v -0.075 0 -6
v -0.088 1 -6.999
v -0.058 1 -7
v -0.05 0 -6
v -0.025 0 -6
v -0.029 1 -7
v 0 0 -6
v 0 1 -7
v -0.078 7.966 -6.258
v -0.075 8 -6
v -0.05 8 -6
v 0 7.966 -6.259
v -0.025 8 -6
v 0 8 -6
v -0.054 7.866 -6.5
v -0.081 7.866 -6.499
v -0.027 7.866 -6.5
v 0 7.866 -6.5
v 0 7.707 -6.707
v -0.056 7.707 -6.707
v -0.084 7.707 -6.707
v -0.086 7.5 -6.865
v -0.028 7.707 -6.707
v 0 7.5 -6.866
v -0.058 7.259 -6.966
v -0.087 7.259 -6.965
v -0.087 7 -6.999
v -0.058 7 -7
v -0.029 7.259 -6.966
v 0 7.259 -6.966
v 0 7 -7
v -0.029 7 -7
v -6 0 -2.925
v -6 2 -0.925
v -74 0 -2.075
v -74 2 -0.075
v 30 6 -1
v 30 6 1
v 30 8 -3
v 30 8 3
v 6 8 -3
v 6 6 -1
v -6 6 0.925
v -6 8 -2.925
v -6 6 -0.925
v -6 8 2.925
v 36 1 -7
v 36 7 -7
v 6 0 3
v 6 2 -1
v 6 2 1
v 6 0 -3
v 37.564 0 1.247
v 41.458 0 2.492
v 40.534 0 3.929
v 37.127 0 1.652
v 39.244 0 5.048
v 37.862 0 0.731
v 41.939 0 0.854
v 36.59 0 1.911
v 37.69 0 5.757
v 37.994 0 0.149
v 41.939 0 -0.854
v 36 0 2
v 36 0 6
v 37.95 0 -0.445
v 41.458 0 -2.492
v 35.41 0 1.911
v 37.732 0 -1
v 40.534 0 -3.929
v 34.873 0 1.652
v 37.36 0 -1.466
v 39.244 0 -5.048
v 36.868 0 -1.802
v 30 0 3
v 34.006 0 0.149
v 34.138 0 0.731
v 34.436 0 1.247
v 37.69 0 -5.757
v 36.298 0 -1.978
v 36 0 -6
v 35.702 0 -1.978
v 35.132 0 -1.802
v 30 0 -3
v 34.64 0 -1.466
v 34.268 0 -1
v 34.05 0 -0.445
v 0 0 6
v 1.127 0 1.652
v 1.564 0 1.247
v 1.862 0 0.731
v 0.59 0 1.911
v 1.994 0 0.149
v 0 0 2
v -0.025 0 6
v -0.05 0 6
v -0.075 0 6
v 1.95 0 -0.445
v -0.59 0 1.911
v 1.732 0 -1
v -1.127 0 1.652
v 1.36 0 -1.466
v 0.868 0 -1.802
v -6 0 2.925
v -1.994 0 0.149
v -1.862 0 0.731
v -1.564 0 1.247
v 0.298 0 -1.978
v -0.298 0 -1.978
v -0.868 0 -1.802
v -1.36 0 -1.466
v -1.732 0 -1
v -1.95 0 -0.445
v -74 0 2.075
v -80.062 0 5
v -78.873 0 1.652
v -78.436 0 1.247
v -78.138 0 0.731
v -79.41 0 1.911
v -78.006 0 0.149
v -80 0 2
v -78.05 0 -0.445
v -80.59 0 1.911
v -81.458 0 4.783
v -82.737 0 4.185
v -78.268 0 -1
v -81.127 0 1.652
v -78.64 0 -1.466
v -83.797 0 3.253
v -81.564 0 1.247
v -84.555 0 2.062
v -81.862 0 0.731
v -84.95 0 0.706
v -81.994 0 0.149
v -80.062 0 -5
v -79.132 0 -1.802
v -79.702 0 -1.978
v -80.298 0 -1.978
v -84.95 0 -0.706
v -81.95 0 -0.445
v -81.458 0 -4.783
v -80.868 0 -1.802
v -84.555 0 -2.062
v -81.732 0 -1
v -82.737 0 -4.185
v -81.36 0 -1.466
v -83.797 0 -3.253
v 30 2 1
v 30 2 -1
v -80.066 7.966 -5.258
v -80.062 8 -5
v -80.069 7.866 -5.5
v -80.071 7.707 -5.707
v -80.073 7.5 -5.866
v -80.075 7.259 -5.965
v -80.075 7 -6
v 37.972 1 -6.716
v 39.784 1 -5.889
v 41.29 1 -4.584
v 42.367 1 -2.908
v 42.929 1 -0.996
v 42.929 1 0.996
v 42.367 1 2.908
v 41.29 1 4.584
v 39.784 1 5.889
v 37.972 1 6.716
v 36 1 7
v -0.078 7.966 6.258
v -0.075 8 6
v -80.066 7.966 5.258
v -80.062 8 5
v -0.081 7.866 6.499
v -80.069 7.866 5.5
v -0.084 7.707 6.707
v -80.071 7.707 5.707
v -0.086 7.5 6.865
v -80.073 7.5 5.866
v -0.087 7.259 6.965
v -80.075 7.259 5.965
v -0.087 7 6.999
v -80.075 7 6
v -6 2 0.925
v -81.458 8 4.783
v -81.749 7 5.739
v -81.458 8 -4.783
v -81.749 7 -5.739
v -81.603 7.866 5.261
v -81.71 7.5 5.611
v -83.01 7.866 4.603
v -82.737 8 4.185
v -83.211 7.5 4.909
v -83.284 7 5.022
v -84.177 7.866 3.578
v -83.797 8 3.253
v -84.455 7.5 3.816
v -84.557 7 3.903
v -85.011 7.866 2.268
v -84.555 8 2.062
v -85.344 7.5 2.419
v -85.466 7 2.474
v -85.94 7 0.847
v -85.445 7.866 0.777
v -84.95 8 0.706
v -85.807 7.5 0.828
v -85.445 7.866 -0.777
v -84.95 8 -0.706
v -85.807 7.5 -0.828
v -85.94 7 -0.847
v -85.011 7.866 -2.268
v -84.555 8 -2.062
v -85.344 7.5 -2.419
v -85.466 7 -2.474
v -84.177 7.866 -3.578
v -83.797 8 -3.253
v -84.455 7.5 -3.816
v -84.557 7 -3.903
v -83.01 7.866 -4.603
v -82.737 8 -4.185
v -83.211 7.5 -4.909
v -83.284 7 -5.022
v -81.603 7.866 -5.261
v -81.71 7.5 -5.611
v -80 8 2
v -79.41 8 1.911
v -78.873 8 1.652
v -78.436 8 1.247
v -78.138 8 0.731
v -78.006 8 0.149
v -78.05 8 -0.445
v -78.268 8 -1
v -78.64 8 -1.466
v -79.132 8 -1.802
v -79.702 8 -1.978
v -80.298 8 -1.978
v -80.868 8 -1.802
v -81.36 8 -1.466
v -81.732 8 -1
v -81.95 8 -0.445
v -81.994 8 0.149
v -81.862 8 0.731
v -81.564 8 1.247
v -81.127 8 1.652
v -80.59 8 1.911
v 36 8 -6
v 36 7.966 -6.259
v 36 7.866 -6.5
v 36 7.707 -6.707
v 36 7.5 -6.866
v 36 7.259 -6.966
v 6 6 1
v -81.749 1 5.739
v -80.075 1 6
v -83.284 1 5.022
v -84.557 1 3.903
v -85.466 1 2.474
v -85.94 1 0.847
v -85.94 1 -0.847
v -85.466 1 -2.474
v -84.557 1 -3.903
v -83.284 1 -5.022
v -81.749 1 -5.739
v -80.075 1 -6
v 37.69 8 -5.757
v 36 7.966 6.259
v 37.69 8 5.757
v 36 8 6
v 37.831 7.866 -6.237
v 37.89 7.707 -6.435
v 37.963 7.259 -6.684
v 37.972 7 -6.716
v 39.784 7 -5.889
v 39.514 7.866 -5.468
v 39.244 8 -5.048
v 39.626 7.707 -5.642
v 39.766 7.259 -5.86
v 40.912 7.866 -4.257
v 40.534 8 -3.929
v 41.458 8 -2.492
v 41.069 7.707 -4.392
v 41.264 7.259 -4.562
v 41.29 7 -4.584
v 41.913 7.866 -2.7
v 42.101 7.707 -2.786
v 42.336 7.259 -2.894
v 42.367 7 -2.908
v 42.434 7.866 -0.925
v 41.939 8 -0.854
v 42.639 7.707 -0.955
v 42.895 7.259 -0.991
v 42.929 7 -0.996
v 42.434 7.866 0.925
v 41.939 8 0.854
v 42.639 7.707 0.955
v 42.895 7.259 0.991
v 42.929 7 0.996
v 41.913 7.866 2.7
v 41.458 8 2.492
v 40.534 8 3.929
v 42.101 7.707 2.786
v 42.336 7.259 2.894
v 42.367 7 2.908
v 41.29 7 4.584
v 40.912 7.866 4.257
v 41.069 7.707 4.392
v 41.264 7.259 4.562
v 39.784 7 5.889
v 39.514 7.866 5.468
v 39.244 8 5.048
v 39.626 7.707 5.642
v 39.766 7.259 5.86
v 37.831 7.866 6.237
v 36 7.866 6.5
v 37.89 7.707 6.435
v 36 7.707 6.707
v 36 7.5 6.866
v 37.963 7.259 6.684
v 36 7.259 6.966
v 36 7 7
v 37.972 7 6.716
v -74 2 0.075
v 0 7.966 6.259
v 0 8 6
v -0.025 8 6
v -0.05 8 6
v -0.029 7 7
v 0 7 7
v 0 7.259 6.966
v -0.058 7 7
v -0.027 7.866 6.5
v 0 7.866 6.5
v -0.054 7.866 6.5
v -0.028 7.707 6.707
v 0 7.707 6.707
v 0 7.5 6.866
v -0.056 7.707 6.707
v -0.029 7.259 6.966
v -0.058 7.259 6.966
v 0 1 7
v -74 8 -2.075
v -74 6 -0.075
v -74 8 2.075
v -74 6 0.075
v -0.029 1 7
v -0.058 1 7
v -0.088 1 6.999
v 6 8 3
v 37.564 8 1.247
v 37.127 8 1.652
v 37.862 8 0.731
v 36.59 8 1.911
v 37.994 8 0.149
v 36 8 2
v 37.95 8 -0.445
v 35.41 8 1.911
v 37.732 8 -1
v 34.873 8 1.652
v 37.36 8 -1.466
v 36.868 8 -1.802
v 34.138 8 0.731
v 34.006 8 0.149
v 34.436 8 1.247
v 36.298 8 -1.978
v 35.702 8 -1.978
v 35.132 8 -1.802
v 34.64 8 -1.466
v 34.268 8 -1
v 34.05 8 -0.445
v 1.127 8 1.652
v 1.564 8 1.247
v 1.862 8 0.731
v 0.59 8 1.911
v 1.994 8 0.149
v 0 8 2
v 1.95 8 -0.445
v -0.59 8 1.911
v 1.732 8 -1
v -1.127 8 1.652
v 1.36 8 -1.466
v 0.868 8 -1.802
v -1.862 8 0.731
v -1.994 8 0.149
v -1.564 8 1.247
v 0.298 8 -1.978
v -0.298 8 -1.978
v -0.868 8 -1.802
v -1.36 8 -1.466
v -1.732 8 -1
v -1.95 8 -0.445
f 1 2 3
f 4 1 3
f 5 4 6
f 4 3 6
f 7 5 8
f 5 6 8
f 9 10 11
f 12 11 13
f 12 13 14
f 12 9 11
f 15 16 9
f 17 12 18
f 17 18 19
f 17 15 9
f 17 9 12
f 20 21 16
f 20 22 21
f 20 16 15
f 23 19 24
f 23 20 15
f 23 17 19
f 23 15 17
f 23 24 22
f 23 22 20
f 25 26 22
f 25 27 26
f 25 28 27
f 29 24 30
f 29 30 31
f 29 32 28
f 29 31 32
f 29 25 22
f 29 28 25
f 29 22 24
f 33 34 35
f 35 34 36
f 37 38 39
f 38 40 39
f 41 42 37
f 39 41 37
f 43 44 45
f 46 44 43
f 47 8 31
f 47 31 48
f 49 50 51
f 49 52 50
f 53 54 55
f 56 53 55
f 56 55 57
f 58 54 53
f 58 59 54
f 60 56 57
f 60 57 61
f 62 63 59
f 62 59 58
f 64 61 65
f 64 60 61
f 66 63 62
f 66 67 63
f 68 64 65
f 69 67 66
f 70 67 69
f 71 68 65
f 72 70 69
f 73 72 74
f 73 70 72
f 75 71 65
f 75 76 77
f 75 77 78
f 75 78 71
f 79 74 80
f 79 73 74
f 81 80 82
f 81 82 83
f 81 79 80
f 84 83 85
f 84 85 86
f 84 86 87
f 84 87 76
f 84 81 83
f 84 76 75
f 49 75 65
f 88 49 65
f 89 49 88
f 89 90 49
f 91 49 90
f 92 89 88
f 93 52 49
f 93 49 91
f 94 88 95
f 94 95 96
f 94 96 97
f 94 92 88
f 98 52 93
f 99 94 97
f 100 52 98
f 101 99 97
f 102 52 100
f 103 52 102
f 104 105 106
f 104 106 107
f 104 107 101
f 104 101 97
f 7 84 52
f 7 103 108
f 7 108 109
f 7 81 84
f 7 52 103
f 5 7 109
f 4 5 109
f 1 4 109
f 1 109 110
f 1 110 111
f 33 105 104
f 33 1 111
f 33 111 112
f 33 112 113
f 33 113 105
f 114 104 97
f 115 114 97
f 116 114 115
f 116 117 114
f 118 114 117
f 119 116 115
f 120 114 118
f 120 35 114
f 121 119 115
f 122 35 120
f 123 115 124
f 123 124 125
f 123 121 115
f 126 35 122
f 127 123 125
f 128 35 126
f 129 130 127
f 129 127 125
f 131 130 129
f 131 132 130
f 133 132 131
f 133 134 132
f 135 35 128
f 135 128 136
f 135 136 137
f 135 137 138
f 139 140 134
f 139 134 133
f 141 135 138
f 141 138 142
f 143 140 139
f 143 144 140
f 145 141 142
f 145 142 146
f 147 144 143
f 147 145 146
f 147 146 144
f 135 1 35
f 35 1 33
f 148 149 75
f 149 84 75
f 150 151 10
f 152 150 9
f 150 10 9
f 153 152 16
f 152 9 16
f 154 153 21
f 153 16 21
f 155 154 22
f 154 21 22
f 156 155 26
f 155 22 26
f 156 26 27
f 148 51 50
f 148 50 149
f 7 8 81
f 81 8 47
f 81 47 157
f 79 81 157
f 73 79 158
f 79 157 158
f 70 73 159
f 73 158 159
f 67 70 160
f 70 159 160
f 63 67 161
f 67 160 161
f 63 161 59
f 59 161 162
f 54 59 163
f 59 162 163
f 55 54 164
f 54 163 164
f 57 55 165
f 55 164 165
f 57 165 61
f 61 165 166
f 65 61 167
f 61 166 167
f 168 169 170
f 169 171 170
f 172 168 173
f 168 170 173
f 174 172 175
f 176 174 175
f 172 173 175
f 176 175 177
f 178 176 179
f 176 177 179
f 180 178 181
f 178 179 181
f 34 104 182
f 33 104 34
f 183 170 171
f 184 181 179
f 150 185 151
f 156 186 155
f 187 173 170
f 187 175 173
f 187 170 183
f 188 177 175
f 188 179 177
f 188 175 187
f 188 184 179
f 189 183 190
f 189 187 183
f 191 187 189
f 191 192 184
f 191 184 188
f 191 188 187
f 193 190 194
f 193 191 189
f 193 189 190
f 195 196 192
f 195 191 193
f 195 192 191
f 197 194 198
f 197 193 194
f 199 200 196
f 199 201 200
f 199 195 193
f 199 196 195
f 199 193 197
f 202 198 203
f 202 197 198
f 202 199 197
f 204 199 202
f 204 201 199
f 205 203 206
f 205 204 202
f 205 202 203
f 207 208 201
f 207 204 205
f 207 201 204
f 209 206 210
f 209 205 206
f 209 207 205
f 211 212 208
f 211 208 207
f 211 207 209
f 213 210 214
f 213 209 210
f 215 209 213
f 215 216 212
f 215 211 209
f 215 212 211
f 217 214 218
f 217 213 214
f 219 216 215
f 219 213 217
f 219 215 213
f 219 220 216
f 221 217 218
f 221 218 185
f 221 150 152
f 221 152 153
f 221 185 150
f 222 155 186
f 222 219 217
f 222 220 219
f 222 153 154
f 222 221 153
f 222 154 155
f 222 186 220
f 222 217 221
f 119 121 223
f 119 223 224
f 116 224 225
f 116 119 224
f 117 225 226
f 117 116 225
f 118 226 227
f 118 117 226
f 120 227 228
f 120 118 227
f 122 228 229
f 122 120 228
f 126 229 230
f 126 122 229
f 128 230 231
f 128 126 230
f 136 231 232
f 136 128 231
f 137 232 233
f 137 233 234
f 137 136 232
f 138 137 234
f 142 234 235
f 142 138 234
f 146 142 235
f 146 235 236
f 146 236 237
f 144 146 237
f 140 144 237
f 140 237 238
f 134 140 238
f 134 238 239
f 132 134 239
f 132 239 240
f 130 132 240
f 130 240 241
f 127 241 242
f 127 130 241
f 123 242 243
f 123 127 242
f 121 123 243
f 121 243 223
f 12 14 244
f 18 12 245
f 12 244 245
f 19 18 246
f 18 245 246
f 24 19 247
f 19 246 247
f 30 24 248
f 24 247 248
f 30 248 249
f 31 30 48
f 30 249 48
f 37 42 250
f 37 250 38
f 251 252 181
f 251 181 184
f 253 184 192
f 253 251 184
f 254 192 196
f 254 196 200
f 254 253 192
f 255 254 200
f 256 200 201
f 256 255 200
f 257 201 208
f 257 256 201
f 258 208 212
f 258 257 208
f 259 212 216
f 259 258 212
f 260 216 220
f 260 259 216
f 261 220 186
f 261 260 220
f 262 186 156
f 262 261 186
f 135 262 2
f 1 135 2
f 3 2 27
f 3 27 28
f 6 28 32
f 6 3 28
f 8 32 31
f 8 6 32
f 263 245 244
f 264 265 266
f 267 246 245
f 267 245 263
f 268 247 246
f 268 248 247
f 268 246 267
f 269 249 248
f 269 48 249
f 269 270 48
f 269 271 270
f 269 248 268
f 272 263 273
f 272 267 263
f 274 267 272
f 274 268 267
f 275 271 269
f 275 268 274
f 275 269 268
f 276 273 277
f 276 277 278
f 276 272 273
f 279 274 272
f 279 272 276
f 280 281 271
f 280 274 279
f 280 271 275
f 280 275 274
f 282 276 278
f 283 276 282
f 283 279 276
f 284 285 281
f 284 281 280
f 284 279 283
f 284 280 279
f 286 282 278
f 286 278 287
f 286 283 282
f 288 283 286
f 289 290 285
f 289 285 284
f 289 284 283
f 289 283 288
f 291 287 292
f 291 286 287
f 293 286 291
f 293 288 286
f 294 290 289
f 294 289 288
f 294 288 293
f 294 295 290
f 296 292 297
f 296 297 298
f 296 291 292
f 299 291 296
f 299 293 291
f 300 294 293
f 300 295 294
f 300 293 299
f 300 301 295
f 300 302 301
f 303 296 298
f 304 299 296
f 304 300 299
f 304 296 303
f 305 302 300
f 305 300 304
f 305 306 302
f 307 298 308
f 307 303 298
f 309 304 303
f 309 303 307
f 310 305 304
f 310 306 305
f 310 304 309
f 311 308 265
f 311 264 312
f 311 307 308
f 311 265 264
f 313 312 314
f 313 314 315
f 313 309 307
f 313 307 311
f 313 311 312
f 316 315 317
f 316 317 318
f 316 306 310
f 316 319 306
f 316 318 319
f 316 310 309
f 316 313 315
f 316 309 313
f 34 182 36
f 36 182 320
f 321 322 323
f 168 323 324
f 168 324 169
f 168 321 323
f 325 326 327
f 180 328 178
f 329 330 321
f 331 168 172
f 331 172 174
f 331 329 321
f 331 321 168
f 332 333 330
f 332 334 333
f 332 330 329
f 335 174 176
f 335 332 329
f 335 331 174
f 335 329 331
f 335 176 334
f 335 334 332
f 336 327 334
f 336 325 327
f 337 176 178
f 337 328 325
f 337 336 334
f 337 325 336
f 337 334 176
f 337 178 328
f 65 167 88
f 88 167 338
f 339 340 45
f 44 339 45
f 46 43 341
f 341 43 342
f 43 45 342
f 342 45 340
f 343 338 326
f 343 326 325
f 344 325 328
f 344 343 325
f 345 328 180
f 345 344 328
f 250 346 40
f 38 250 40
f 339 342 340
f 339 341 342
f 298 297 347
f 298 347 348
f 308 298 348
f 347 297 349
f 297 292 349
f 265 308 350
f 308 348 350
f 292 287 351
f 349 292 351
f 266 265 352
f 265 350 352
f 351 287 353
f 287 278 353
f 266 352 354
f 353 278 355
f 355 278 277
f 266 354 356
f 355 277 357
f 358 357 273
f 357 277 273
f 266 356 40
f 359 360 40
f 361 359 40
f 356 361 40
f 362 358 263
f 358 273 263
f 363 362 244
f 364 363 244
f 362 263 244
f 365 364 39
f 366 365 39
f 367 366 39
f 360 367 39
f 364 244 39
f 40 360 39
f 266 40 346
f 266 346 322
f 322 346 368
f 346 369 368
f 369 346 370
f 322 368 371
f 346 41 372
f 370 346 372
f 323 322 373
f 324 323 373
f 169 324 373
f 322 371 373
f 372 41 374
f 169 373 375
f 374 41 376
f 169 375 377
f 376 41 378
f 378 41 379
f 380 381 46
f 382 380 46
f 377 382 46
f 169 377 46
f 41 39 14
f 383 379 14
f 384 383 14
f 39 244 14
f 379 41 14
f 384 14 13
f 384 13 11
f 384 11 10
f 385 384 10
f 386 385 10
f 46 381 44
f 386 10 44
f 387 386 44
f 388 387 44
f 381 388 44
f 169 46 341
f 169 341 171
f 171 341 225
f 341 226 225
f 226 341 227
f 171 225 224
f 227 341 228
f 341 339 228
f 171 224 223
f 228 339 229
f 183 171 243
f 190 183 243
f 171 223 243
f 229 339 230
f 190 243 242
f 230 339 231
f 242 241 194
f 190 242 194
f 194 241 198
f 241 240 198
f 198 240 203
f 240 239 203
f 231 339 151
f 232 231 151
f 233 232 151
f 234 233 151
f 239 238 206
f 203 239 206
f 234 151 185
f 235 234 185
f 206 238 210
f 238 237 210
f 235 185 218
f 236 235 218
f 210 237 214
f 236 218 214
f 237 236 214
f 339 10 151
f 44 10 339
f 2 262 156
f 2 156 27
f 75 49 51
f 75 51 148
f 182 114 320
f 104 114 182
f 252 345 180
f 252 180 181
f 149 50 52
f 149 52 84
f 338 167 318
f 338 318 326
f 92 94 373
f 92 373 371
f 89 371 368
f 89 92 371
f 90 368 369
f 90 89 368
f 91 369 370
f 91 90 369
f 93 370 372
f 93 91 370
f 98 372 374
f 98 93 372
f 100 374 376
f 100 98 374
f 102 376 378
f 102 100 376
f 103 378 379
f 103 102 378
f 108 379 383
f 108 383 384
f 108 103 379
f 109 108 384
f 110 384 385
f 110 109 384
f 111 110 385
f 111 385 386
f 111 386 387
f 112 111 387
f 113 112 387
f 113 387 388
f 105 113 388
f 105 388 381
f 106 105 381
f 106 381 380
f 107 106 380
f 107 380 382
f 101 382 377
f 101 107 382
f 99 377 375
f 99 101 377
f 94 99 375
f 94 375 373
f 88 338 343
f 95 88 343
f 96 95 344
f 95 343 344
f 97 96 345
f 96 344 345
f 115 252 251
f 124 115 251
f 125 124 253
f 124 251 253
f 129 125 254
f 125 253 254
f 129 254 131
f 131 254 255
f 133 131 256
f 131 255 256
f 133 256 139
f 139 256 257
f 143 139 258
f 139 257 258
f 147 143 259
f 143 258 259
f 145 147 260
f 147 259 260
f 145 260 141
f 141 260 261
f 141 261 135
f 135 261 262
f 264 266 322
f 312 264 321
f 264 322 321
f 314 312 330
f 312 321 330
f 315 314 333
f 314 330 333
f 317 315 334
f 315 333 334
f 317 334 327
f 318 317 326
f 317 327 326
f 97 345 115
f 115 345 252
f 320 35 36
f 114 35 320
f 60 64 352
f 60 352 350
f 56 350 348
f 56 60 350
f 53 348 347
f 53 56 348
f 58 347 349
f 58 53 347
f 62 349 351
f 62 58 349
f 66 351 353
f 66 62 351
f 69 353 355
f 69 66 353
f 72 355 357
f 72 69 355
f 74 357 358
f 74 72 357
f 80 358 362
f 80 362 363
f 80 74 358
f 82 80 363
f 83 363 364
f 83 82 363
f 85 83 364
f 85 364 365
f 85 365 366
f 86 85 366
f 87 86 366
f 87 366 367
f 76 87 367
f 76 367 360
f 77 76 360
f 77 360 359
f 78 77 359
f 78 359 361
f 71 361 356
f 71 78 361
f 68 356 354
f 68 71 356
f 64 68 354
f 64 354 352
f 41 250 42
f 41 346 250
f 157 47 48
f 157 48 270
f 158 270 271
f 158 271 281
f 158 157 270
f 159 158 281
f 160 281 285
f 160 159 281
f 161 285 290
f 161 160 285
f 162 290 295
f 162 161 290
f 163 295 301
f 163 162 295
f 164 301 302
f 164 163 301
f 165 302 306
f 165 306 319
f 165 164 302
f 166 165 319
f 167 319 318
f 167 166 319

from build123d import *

# Parameters (mm, degrees)
SKETCH1_R           = 2
BOSS_EXTRUDE1_DEPTH = 8
SKETCH2_W           = 24
SKETCH2_H           = 6
CUT_EXTRUDE1_DEPTH  = 2
SKETCH3_W           = 24
SKETCH3_H           = 6
CUT_EXTRUDE2_DEPTH  = 2
FILLET2_R           = 1
CHAMFER1_SIZE       = 1
CHAMFER2_SIZE       = 2
CHAMFER3_SIZE       = 2
CHAMFER5_SIZE       = 2
CHAMFER6_SIZE       = 2
CHAMFER7_SIZE       = 2
CHAMFER8_SIZE       = 2
CHAMFER9_SIZE       = 2
CHAMFER10_SIZE      = 2


with BuildPart() as part:
    # Sketch1 → Boss-Extrude1 (new body)
    with BuildSketch(Plane(origin=(0, 0, 0), x_dir=(1, 0, 0), z_dir=(0, 1, 0))):
        with BuildLine():
            Line((0, 7), (36, 7))
            ThreePointArc((36, 7), (43, 0), (36, -7))
            Line((36, -7), (0, -7))
            ThreePointArc((0, -7), (-0.043750855, -6.999863275), (-0.0875, -6.999453104))
            Line((-0.0875, -6.999453104), (-80.075, -5.999531232))
            ThreePointArc((-80.075, -5.999531232), (-86, 0), (-80.075, 5.999531232))
            Line((-80.075, 5.999531232), (-0.0875, 6.999453104))
            ThreePointArc((-0.0875, 6.999453104), (-0.043750855, 6.999863275), (0, 7))
        make_face()
        with Locations(Location((0, 0, 0), (0, 0, 270))):
            Circle(SKETCH1_R, mode=Mode.SUBTRACT)
        with Locations(Location((-80, 0, 0), (0, 0, 270))):
            Circle(SKETCH1_R, mode=Mode.SUBTRACT)
        with Locations(Location((36, 0, 0), (0, 0, 270))):
            Circle(SKETCH1_R, mode=Mode.SUBTRACT)
    extrude(amount=BOSS_EXTRUDE1_DEPTH)

    # Sketch2 → Cut-Extrude1 (cut)
    with BuildSketch(Plane(origin=(0, 8, 0), x_dir=(1, 0, 0), z_dir=(0, 1, 0))):
        Polygon((-74, 2.075162128), (-6, 2.925228542), (-6, -2.925228542), (-74, -2.075162128), align=None)
        with Locations((18, 0)):
            Rectangle(SKETCH2_W, SKETCH2_H)
    extrude(amount=-CUT_EXTRUDE1_DEPTH, mode=Mode.SUBTRACT)

    # Sketch3 → Cut-Extrude2 (cut)
    with BuildSketch(Plane.XZ):
        Polygon((-74, 2.075162128), (-6, 2.925228542), (-6, -2.925228542), (-74, -2.075162128), align=None)
        with Locations((18, 0)):
            Rectangle(SKETCH3_W, SKETCH3_H)
    extrude(amount=-CUT_EXTRUDE2_DEPTH, mode=Mode.SUBTRACT)

    # Fillet2
    fillet2_edges = [part.edges().sort_by_distance(p)[0] for p in [
        (-86, 8, 0),
        (-40.08125, 8, 6.499492168),
        (-0.043750855, 8, 6.999863275),
        (18, 8, 7),
        (43, 8, 0),
        (18, 8, -7),
        (-0.043750855, 8, -6.999863275),
        (-40.08125, 8, -6.499492168),
    ]]
    fillet(fillet2_edges, radius=FILLET2_R)

    # Chamfer1
    chamfer1_edges = [part.edges().sort_by_distance(p)[0] for p in [
        (-40.08125, 0, 6.499492168),
        (-86, 0, 0),
        (-40.08125, 0, -6.499492168),
        (-0.043750855, 0, -6.999863275),
        (18, 0, -7),
        (43, 0, 0),
        (18, 0, 7),
        (-0.043750855, 0, 6.999863275),
    ]]
    chamfer(chamfer1_edges, length=CHAMFER1_SIZE)

    # Chamfer2
    chamfer2_edges = [part.edges().sort_by_distance(p)[0] for p in [
        (18, 2, -3),
    ]]
    chamfer(chamfer2_edges, length=CHAMFER2_SIZE - 0.0001)  # a hair under: the kernel refuses the full size

    # Chamfer3
    chamfer3_edges = [part.edges().sort_by_distance(p)[0] for p in [
        (18, 2, 3),
    ]]
    chamfer(chamfer3_edges, length=CHAMFER3_SIZE - 0.0001)  # a hair under: the kernel refuses the full size

    # Chamfer5
    chamfer5_edges = [part.edges().sort_by_distance(p)[0] for p in [
        (-40, 2, -2.500195335),
    ]]
    chamfer(chamfer5_edges, length=CHAMFER5_SIZE - 0.0001)  # a hair under: the kernel refuses the full size

    # Chamfer6
    chamfer6_edges = [part.edges().sort_by_distance(p)[0] for p in [
        (-40, 2, 2.500195335),
    ]]
    chamfer(chamfer6_edges, length=CHAMFER6_SIZE - 0.0001)  # a hair under: the kernel refuses the full size

    # Chamfer7
    chamfer7_edges = [part.edges().sort_by_distance(p)[0] for p in [
        (-40, 6, -2.500195335),
    ]]
    chamfer(chamfer7_edges, length=CHAMFER7_SIZE - 0.0001)  # a hair under: the kernel refuses the full size

    # Chamfer8
    chamfer8_edges = [part.edges().sort_by_distance(p)[0] for p in [
        (18, 6, -3),
    ]]
    chamfer(chamfer8_edges, length=CHAMFER8_SIZE - 0.0001)  # a hair under: the kernel refuses the full size

    # Chamfer9
    chamfer9_edges = [part.edges().sort_by_distance(p)[0] for p in [
        (18, 6, 3),
    ]]
    chamfer(chamfer9_edges, length=CHAMFER9_SIZE - 0.0001)  # a hair under: the kernel refuses the full size

    # Chamfer10
    chamfer10_edges = [part.edges().sort_by_distance(p)[0] for p in [
        (-40, 6, 2.500195335),
    ]]
    chamfer(chamfer10_edges, length=CHAMFER10_SIZE - 0.0001)  # a hair under: the kernel refuses the full size


solid = part.part
